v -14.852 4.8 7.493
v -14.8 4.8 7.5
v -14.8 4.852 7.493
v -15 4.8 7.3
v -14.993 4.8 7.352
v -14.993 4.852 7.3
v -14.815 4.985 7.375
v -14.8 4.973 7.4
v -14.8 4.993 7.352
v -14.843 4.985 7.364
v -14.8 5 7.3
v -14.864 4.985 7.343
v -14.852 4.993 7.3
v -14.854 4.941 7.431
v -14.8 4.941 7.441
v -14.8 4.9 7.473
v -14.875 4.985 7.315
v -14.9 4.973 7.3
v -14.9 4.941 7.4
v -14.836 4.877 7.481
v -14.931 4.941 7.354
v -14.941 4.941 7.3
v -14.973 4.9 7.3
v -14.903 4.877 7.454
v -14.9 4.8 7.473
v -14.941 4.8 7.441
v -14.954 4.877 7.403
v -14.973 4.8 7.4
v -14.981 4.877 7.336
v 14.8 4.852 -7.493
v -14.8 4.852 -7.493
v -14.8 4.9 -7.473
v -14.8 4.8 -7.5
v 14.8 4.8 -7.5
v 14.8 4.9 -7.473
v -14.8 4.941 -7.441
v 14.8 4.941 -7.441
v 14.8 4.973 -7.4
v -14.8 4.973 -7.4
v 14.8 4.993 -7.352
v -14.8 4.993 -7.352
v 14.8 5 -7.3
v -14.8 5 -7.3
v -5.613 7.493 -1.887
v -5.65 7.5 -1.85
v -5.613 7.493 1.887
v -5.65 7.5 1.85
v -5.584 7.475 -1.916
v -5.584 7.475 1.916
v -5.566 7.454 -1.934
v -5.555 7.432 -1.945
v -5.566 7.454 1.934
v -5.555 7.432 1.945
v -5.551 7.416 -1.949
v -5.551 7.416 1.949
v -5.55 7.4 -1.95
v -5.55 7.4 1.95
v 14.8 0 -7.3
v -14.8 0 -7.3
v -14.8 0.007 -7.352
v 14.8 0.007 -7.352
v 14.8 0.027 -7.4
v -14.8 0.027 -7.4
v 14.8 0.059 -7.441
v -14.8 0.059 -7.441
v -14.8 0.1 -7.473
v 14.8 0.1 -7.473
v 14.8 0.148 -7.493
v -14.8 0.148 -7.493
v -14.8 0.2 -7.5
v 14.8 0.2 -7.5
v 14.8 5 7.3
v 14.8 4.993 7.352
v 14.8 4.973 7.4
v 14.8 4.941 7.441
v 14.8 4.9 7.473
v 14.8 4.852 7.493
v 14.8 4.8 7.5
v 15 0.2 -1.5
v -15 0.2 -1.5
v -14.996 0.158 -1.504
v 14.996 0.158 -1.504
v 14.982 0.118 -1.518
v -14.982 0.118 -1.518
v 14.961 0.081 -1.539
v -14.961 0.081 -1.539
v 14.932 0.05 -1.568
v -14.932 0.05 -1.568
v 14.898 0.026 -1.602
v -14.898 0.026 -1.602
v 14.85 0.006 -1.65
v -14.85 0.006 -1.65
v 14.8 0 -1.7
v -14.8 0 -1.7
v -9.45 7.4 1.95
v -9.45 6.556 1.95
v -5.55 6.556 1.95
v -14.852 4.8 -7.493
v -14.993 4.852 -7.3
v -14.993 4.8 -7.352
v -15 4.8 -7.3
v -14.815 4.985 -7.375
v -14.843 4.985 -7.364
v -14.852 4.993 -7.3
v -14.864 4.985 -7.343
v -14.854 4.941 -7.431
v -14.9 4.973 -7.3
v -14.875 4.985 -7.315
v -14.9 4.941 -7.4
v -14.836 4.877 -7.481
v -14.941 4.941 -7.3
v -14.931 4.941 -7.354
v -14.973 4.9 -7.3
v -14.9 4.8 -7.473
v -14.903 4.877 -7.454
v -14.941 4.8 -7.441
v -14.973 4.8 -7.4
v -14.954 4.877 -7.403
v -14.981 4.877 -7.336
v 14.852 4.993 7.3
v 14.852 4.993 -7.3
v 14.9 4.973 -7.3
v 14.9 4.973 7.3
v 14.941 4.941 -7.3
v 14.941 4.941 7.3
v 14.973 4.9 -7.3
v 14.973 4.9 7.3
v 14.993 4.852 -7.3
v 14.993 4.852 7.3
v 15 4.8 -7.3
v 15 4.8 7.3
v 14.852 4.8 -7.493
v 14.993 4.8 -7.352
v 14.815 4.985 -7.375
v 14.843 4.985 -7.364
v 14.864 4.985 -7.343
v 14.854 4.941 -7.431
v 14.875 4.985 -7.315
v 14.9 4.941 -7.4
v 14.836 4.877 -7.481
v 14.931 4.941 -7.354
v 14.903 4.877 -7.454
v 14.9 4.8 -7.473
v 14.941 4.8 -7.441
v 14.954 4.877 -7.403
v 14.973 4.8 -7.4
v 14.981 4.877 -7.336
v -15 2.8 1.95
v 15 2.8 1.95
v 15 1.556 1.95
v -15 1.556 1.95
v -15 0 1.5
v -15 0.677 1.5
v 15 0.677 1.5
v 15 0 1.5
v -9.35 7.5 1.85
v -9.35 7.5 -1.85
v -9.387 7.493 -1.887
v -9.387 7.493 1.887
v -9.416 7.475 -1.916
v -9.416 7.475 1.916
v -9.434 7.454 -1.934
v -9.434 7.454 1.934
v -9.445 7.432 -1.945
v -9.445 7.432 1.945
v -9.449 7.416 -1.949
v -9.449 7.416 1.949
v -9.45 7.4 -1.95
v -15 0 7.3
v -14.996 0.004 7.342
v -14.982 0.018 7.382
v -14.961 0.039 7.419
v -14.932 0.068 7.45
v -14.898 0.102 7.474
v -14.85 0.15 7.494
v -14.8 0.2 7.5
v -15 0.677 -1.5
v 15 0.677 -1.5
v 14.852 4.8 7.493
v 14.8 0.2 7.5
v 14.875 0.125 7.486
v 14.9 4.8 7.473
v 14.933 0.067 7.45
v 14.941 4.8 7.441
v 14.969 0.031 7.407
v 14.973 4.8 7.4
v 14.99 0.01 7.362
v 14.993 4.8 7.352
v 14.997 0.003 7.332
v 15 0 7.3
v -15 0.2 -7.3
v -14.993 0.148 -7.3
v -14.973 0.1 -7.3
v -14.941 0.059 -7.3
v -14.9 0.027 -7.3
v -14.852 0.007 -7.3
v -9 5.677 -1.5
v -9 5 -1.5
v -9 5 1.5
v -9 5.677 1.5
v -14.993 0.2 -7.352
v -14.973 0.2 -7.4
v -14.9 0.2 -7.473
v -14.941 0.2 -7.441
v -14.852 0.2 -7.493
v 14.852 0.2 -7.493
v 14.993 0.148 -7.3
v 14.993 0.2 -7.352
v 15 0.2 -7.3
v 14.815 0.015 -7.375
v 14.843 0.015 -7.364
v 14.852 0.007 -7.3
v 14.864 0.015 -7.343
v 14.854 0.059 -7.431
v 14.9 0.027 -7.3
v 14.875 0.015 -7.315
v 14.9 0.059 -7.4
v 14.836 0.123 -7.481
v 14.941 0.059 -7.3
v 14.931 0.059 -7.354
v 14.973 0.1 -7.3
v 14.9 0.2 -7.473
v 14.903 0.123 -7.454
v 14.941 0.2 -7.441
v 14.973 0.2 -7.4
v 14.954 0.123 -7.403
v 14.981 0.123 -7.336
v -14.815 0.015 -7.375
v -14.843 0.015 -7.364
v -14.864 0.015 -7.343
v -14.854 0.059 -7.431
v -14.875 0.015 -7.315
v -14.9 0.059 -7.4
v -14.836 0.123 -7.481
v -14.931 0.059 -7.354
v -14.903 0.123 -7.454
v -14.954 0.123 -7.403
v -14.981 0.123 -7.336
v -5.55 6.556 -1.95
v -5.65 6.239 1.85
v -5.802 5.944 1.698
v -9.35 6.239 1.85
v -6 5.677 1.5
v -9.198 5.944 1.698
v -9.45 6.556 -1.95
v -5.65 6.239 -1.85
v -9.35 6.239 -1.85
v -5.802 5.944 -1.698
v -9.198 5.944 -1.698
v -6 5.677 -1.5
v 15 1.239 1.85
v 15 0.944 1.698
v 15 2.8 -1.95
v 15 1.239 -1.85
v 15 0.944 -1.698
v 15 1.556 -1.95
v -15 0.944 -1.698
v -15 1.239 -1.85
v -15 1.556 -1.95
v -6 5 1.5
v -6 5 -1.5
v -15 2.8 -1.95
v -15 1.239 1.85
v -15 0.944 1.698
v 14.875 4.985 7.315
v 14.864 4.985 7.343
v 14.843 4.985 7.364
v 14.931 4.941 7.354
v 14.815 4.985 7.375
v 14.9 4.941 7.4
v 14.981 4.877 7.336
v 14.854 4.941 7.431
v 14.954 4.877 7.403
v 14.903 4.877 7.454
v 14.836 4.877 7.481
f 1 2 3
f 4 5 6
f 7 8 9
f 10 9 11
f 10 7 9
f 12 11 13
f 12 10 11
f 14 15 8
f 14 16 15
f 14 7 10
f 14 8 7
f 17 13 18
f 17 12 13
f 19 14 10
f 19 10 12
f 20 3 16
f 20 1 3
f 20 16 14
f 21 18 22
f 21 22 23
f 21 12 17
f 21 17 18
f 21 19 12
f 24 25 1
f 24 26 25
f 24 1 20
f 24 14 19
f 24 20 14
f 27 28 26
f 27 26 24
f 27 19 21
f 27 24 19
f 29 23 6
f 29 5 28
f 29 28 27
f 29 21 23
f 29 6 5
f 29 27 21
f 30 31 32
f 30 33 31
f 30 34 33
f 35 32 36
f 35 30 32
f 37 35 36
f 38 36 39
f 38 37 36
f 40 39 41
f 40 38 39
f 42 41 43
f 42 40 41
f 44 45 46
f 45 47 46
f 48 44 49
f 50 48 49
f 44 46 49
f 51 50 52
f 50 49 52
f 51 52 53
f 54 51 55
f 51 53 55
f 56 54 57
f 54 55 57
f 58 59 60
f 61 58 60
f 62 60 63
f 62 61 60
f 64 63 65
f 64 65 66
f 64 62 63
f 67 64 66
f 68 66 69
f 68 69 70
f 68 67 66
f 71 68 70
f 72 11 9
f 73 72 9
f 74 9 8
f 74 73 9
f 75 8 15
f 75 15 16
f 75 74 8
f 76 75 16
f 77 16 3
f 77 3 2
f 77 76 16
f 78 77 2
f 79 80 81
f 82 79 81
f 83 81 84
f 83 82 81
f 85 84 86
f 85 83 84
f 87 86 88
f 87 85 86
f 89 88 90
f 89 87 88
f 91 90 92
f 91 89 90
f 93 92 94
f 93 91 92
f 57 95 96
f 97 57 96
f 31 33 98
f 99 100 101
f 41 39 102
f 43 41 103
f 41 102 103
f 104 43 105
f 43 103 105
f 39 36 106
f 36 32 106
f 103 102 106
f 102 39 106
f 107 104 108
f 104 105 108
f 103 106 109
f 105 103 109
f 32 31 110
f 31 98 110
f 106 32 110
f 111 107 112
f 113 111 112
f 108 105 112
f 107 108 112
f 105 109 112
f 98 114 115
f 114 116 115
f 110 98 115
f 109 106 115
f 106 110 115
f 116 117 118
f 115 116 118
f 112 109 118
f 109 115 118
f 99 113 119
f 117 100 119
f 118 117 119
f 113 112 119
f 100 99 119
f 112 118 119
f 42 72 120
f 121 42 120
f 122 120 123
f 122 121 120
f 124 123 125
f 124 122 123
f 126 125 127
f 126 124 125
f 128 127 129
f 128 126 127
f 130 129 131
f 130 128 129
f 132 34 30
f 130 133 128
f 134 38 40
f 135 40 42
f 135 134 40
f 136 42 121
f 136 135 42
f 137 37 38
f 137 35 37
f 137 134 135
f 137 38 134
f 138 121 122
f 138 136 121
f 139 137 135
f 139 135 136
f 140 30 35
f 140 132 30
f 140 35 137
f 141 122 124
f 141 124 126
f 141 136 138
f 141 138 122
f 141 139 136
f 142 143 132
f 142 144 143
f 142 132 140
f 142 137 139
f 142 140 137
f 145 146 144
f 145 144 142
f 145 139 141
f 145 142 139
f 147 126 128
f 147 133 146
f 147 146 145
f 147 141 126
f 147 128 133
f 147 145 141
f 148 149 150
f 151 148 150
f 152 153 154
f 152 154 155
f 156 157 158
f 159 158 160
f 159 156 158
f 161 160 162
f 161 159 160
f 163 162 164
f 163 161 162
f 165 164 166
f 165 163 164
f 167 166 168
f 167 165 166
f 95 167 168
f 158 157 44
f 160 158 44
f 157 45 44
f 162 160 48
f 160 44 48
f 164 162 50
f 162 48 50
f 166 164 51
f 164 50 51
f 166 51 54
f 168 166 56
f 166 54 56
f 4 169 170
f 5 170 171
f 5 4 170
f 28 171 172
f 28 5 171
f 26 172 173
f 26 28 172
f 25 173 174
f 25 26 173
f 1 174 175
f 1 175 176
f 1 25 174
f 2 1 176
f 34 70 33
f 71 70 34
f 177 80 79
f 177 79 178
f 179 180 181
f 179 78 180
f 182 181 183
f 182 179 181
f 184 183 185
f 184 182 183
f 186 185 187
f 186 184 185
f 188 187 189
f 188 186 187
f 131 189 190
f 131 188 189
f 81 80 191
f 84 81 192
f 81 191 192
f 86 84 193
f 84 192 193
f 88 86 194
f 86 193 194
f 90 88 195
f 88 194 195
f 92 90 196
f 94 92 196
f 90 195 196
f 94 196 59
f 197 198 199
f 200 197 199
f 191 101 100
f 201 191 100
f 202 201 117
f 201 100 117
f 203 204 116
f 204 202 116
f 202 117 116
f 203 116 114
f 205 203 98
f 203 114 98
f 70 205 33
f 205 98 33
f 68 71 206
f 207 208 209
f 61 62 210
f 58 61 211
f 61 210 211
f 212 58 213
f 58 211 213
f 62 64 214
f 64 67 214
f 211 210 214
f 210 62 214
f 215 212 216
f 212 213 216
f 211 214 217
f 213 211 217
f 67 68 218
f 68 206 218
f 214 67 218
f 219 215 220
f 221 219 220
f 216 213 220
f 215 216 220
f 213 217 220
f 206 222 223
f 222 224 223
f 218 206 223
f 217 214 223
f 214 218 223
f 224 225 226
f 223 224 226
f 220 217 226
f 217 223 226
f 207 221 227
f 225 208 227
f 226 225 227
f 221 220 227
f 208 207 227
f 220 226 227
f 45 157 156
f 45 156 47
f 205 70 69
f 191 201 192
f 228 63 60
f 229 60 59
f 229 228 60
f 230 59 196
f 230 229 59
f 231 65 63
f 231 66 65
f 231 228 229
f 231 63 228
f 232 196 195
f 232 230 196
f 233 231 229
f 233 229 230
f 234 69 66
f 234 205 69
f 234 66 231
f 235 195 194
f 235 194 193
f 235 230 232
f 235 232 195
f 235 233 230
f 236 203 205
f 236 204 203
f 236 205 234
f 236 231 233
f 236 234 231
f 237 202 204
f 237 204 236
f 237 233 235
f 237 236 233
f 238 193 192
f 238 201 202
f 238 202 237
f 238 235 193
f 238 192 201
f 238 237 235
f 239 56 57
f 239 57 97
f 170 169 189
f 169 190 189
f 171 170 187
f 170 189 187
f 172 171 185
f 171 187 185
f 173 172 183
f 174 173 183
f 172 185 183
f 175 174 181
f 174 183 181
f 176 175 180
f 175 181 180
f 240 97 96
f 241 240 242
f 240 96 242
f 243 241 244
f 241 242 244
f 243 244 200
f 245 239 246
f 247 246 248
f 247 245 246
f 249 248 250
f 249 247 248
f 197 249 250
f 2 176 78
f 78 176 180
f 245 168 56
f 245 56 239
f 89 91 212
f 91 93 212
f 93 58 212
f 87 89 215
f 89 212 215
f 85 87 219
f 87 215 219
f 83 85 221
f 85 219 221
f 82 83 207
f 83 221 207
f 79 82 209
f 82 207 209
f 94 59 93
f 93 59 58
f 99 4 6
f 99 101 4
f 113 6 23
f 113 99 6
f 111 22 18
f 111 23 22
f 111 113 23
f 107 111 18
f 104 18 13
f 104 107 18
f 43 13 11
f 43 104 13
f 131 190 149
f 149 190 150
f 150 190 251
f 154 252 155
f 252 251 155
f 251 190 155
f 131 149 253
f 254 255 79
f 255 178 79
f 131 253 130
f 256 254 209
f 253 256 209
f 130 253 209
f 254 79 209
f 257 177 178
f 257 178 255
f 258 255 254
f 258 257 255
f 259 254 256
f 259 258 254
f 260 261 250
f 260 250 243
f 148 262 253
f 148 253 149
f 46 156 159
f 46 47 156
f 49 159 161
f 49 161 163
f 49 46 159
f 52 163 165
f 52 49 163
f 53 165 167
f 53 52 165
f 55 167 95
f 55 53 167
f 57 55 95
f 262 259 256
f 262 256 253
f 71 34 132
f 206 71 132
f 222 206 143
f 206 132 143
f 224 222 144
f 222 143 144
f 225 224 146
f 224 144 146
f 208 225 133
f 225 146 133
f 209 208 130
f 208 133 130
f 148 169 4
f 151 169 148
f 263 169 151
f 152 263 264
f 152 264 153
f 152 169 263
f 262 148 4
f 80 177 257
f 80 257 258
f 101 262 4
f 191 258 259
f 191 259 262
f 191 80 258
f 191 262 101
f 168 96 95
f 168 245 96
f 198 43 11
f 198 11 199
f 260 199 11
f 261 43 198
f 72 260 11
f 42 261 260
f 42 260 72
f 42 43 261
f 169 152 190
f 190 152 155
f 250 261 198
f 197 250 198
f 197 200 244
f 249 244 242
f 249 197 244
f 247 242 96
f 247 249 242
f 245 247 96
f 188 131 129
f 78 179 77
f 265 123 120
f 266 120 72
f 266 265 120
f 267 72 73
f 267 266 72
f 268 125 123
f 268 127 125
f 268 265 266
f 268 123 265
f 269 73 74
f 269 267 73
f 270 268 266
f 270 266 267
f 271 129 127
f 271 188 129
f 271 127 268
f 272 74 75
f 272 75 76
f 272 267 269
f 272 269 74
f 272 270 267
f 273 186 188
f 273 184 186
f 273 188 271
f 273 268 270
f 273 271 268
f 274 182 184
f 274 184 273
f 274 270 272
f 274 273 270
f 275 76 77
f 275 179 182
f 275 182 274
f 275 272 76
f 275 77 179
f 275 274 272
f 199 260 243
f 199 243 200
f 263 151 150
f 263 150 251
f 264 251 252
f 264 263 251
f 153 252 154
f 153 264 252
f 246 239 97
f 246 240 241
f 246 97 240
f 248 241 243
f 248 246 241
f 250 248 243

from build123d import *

# Parameters (mm, degrees)
SKETCH_1_W           = 30
SKETCH_1_H           = 15
EXTRUDE_1_DEPTH      = 5
CUT_EXTRUDE_1_REACH  = 33.325
FILLET_1_R           = 0.2
SKETCH_3_W           = 3
SKETCH_3_H           = 3
EXTRUDE_2_DEPTH      = 1
EXTRUDE_3_DEPTH      = 2
EXTRUDE_3_DEPTH_BACK = 2
CUT_EXTRUDE_2_REACH  = 28.652
FILLET_2_R           = 0.1


with BuildPart() as part:
    # 草图1 → 凸台-拉伸1 (new body)
    with BuildSketch(Plane(origin=(0, 0, 0), x_dir=(1, 0, 0), z_dir=(0, 1, 0))):
        Rectangle(SKETCH_1_W, SKETCH_1_H)
    extrude(amount=EXTRUDE_1_DEPTH)

    # 草图2 → 切除-拉伸1 (cut, up to next)
    with BuildSketch(Plane.ZY.offset(15), mode=Mode.PRIVATE) as cut_extrude_1_sk1:
        with BuildLine():
            Line((-1.5, 0), (-1.5, 0.677124344))
            ThreePointArc((-1.5, 0.677124344), (-1.780042303, 1.088161527), (-1.95, 1.555590279))
            Line((-1.95, 1.555590279), (-1.95, 2.8))
            Line((-1.95, 2.8), (1.95, 2.8))
            Line((1.95, 2.8), (1.95, 1.555590279))
            ThreePointArc((1.95, 1.555590279), (1.780042303, 1.088161527), (1.5, 0.677124344))
            Line((1.5, 0.677124344), (1.5, 0))
            Line((1.5, 0), (-1.5, 0))
        make_face()
    cut_extrude_1_tool1 = extrude(cut_extrude_1_sk1.sketch, amount=-CUT_EXTRUDE_1_REACH, mode=Mode.PRIVATE) & part.part
    add(cut_extrude_1_tool1.solids().sort_by_distance((-15, 1.479302, 0))[0], mode=Mode.SUBTRACT)

    # 圆角1
    fillet_1_edges = [part.edges().sort_by_distance(p)[0] for p in [
        (15, 2.5, -7.5),
        (-15, 2.5, -7.5),
        (0, 0, -7.5),
        (-15, 0, -4.5),
        (0, 0, -1.5),
        (-15, 2.5, 7.5),
        (15, 2.5, 7.5),
        (0, 0, 7.5),
        (0, 5, -7.5),
        (15, 5, 0),
        (0, 5, 7.5),
        (-15, 5, 0),
        (15, 0, -4.5),
    ]]
    fillet(fillet_1_edges, radius=FILLET_1_R)

    # 草图3 → 凸台-拉伸2 (add)
    with BuildSketch(Plane(origin=(0, 5, 0), x_dir=(-1, 0, 0), z_dir=(0, 1, 0))):
        with Locations((7.5, 0)):
            Rectangle(SKETCH_3_W, SKETCH_3_H)
    extrude(amount=EXTRUDE_2_DEPTH)

    # 草图4 → 凸台-拉伸3 (add, two sides: drawn at the far end of the back side and taken through both)
    with BuildSketch(Plane.XY.offset(-EXTRUDE_3_DEPTH_BACK)):
        with BuildLine():
            Line((-9.45, 7.5), (-5.55, 7.5))
            Line((-5.55, 7.5), (-5.55, 6.555590279))
            ThreePointArc((-5.55, 6.555590279), (-5.719957697, 6.088161527), (-6, 5.677124344))
            Line((-6, 5.677124344), (-9, 5.677124344))
            ThreePointArc((-9, 5.677124344), (-9.280042303, 6.088161527), (-9.45, 6.555590279))
            Line((-9.45, 6.555590279), (-9.45, 7.5))
        make_face()
    extrude(amount=EXTRUDE_3_DEPTH + EXTRUDE_3_DEPTH_BACK)

    # 草图5 → 切除-拉伸2 (cut, up to next)
    with BuildSketch(Plane.ZY.offset(9.45), mode=Mode.PRIVATE) as cut_extrude_2_sk1:
        with BuildLine():
            Line((-1.95, 7.5), (-1.95, 6.555590279))
            ThreePointArc((-1.95, 6.555590279), (-1.780042303, 6.088161527), (-1.5, 5.677124344))
            Line((-1.5, 5.677124344), (-2, 5.677124344))
            Line((-2, 5.677124344), (-2, 7.5))
            Line((-2, 7.5), (-1.95, 7.5))
        make_face()
    cut_extrude_2_tool1 = extrude(cut_extrude_2_sk1.sketch, amount=-CUT_EXTRUDE_2_REACH, mode=Mode.PRIVATE) & part.part
    # 草图5 → 切除-拉伸2 (cut, up to next)
    with BuildSketch(Plane.ZY.offset(9.45), mode=Mode.PRIVATE) as cut_extrude_2_sk2:
        with BuildLine():
            Line((2, 5.677124344), (2, 7.5))
            Line((2, 7.5), (1.95, 7.5))
            Line((1.95, 7.5), (1.95, 6.555590279))
            ThreePointArc((1.95, 6.555590279), (1.780042303, 6.088161527), (1.5, 5.677124344))
            Line((1.5, 5.677124344), (2, 5.677124344))
        make_face()
    cut_extrude_2_tool2 = extrude(cut_extrude_2_sk2.sketch, amount=-CUT_EXTRUDE_2_REACH, mode=Mode.PRIVATE) & part.part
    add(cut_extrude_2_tool1.solids().sort_by_distance((-9.45, 6.175075, -1.873038))[0], mode=Mode.SUBTRACT)
    add(cut_extrude_2_tool2.solids().sort_by_distance((-9.45, 6.175075, 1.873038))[0], mode=Mode.SUBTRACT)

    # 圆角2
    fillet_2_edges = [part.edges().sort_by_distance(p)[0] for p in [
        (-5.55, 7.5, 0),
        (-9.45, 7.5, 0),
        (-7.5, 7.5, -1.95),
        (-7.5, 7.5, 1.95),
    ]]
    fillet(fillet_2_edges, radius=FILLET_2_R)


solid = part.part
